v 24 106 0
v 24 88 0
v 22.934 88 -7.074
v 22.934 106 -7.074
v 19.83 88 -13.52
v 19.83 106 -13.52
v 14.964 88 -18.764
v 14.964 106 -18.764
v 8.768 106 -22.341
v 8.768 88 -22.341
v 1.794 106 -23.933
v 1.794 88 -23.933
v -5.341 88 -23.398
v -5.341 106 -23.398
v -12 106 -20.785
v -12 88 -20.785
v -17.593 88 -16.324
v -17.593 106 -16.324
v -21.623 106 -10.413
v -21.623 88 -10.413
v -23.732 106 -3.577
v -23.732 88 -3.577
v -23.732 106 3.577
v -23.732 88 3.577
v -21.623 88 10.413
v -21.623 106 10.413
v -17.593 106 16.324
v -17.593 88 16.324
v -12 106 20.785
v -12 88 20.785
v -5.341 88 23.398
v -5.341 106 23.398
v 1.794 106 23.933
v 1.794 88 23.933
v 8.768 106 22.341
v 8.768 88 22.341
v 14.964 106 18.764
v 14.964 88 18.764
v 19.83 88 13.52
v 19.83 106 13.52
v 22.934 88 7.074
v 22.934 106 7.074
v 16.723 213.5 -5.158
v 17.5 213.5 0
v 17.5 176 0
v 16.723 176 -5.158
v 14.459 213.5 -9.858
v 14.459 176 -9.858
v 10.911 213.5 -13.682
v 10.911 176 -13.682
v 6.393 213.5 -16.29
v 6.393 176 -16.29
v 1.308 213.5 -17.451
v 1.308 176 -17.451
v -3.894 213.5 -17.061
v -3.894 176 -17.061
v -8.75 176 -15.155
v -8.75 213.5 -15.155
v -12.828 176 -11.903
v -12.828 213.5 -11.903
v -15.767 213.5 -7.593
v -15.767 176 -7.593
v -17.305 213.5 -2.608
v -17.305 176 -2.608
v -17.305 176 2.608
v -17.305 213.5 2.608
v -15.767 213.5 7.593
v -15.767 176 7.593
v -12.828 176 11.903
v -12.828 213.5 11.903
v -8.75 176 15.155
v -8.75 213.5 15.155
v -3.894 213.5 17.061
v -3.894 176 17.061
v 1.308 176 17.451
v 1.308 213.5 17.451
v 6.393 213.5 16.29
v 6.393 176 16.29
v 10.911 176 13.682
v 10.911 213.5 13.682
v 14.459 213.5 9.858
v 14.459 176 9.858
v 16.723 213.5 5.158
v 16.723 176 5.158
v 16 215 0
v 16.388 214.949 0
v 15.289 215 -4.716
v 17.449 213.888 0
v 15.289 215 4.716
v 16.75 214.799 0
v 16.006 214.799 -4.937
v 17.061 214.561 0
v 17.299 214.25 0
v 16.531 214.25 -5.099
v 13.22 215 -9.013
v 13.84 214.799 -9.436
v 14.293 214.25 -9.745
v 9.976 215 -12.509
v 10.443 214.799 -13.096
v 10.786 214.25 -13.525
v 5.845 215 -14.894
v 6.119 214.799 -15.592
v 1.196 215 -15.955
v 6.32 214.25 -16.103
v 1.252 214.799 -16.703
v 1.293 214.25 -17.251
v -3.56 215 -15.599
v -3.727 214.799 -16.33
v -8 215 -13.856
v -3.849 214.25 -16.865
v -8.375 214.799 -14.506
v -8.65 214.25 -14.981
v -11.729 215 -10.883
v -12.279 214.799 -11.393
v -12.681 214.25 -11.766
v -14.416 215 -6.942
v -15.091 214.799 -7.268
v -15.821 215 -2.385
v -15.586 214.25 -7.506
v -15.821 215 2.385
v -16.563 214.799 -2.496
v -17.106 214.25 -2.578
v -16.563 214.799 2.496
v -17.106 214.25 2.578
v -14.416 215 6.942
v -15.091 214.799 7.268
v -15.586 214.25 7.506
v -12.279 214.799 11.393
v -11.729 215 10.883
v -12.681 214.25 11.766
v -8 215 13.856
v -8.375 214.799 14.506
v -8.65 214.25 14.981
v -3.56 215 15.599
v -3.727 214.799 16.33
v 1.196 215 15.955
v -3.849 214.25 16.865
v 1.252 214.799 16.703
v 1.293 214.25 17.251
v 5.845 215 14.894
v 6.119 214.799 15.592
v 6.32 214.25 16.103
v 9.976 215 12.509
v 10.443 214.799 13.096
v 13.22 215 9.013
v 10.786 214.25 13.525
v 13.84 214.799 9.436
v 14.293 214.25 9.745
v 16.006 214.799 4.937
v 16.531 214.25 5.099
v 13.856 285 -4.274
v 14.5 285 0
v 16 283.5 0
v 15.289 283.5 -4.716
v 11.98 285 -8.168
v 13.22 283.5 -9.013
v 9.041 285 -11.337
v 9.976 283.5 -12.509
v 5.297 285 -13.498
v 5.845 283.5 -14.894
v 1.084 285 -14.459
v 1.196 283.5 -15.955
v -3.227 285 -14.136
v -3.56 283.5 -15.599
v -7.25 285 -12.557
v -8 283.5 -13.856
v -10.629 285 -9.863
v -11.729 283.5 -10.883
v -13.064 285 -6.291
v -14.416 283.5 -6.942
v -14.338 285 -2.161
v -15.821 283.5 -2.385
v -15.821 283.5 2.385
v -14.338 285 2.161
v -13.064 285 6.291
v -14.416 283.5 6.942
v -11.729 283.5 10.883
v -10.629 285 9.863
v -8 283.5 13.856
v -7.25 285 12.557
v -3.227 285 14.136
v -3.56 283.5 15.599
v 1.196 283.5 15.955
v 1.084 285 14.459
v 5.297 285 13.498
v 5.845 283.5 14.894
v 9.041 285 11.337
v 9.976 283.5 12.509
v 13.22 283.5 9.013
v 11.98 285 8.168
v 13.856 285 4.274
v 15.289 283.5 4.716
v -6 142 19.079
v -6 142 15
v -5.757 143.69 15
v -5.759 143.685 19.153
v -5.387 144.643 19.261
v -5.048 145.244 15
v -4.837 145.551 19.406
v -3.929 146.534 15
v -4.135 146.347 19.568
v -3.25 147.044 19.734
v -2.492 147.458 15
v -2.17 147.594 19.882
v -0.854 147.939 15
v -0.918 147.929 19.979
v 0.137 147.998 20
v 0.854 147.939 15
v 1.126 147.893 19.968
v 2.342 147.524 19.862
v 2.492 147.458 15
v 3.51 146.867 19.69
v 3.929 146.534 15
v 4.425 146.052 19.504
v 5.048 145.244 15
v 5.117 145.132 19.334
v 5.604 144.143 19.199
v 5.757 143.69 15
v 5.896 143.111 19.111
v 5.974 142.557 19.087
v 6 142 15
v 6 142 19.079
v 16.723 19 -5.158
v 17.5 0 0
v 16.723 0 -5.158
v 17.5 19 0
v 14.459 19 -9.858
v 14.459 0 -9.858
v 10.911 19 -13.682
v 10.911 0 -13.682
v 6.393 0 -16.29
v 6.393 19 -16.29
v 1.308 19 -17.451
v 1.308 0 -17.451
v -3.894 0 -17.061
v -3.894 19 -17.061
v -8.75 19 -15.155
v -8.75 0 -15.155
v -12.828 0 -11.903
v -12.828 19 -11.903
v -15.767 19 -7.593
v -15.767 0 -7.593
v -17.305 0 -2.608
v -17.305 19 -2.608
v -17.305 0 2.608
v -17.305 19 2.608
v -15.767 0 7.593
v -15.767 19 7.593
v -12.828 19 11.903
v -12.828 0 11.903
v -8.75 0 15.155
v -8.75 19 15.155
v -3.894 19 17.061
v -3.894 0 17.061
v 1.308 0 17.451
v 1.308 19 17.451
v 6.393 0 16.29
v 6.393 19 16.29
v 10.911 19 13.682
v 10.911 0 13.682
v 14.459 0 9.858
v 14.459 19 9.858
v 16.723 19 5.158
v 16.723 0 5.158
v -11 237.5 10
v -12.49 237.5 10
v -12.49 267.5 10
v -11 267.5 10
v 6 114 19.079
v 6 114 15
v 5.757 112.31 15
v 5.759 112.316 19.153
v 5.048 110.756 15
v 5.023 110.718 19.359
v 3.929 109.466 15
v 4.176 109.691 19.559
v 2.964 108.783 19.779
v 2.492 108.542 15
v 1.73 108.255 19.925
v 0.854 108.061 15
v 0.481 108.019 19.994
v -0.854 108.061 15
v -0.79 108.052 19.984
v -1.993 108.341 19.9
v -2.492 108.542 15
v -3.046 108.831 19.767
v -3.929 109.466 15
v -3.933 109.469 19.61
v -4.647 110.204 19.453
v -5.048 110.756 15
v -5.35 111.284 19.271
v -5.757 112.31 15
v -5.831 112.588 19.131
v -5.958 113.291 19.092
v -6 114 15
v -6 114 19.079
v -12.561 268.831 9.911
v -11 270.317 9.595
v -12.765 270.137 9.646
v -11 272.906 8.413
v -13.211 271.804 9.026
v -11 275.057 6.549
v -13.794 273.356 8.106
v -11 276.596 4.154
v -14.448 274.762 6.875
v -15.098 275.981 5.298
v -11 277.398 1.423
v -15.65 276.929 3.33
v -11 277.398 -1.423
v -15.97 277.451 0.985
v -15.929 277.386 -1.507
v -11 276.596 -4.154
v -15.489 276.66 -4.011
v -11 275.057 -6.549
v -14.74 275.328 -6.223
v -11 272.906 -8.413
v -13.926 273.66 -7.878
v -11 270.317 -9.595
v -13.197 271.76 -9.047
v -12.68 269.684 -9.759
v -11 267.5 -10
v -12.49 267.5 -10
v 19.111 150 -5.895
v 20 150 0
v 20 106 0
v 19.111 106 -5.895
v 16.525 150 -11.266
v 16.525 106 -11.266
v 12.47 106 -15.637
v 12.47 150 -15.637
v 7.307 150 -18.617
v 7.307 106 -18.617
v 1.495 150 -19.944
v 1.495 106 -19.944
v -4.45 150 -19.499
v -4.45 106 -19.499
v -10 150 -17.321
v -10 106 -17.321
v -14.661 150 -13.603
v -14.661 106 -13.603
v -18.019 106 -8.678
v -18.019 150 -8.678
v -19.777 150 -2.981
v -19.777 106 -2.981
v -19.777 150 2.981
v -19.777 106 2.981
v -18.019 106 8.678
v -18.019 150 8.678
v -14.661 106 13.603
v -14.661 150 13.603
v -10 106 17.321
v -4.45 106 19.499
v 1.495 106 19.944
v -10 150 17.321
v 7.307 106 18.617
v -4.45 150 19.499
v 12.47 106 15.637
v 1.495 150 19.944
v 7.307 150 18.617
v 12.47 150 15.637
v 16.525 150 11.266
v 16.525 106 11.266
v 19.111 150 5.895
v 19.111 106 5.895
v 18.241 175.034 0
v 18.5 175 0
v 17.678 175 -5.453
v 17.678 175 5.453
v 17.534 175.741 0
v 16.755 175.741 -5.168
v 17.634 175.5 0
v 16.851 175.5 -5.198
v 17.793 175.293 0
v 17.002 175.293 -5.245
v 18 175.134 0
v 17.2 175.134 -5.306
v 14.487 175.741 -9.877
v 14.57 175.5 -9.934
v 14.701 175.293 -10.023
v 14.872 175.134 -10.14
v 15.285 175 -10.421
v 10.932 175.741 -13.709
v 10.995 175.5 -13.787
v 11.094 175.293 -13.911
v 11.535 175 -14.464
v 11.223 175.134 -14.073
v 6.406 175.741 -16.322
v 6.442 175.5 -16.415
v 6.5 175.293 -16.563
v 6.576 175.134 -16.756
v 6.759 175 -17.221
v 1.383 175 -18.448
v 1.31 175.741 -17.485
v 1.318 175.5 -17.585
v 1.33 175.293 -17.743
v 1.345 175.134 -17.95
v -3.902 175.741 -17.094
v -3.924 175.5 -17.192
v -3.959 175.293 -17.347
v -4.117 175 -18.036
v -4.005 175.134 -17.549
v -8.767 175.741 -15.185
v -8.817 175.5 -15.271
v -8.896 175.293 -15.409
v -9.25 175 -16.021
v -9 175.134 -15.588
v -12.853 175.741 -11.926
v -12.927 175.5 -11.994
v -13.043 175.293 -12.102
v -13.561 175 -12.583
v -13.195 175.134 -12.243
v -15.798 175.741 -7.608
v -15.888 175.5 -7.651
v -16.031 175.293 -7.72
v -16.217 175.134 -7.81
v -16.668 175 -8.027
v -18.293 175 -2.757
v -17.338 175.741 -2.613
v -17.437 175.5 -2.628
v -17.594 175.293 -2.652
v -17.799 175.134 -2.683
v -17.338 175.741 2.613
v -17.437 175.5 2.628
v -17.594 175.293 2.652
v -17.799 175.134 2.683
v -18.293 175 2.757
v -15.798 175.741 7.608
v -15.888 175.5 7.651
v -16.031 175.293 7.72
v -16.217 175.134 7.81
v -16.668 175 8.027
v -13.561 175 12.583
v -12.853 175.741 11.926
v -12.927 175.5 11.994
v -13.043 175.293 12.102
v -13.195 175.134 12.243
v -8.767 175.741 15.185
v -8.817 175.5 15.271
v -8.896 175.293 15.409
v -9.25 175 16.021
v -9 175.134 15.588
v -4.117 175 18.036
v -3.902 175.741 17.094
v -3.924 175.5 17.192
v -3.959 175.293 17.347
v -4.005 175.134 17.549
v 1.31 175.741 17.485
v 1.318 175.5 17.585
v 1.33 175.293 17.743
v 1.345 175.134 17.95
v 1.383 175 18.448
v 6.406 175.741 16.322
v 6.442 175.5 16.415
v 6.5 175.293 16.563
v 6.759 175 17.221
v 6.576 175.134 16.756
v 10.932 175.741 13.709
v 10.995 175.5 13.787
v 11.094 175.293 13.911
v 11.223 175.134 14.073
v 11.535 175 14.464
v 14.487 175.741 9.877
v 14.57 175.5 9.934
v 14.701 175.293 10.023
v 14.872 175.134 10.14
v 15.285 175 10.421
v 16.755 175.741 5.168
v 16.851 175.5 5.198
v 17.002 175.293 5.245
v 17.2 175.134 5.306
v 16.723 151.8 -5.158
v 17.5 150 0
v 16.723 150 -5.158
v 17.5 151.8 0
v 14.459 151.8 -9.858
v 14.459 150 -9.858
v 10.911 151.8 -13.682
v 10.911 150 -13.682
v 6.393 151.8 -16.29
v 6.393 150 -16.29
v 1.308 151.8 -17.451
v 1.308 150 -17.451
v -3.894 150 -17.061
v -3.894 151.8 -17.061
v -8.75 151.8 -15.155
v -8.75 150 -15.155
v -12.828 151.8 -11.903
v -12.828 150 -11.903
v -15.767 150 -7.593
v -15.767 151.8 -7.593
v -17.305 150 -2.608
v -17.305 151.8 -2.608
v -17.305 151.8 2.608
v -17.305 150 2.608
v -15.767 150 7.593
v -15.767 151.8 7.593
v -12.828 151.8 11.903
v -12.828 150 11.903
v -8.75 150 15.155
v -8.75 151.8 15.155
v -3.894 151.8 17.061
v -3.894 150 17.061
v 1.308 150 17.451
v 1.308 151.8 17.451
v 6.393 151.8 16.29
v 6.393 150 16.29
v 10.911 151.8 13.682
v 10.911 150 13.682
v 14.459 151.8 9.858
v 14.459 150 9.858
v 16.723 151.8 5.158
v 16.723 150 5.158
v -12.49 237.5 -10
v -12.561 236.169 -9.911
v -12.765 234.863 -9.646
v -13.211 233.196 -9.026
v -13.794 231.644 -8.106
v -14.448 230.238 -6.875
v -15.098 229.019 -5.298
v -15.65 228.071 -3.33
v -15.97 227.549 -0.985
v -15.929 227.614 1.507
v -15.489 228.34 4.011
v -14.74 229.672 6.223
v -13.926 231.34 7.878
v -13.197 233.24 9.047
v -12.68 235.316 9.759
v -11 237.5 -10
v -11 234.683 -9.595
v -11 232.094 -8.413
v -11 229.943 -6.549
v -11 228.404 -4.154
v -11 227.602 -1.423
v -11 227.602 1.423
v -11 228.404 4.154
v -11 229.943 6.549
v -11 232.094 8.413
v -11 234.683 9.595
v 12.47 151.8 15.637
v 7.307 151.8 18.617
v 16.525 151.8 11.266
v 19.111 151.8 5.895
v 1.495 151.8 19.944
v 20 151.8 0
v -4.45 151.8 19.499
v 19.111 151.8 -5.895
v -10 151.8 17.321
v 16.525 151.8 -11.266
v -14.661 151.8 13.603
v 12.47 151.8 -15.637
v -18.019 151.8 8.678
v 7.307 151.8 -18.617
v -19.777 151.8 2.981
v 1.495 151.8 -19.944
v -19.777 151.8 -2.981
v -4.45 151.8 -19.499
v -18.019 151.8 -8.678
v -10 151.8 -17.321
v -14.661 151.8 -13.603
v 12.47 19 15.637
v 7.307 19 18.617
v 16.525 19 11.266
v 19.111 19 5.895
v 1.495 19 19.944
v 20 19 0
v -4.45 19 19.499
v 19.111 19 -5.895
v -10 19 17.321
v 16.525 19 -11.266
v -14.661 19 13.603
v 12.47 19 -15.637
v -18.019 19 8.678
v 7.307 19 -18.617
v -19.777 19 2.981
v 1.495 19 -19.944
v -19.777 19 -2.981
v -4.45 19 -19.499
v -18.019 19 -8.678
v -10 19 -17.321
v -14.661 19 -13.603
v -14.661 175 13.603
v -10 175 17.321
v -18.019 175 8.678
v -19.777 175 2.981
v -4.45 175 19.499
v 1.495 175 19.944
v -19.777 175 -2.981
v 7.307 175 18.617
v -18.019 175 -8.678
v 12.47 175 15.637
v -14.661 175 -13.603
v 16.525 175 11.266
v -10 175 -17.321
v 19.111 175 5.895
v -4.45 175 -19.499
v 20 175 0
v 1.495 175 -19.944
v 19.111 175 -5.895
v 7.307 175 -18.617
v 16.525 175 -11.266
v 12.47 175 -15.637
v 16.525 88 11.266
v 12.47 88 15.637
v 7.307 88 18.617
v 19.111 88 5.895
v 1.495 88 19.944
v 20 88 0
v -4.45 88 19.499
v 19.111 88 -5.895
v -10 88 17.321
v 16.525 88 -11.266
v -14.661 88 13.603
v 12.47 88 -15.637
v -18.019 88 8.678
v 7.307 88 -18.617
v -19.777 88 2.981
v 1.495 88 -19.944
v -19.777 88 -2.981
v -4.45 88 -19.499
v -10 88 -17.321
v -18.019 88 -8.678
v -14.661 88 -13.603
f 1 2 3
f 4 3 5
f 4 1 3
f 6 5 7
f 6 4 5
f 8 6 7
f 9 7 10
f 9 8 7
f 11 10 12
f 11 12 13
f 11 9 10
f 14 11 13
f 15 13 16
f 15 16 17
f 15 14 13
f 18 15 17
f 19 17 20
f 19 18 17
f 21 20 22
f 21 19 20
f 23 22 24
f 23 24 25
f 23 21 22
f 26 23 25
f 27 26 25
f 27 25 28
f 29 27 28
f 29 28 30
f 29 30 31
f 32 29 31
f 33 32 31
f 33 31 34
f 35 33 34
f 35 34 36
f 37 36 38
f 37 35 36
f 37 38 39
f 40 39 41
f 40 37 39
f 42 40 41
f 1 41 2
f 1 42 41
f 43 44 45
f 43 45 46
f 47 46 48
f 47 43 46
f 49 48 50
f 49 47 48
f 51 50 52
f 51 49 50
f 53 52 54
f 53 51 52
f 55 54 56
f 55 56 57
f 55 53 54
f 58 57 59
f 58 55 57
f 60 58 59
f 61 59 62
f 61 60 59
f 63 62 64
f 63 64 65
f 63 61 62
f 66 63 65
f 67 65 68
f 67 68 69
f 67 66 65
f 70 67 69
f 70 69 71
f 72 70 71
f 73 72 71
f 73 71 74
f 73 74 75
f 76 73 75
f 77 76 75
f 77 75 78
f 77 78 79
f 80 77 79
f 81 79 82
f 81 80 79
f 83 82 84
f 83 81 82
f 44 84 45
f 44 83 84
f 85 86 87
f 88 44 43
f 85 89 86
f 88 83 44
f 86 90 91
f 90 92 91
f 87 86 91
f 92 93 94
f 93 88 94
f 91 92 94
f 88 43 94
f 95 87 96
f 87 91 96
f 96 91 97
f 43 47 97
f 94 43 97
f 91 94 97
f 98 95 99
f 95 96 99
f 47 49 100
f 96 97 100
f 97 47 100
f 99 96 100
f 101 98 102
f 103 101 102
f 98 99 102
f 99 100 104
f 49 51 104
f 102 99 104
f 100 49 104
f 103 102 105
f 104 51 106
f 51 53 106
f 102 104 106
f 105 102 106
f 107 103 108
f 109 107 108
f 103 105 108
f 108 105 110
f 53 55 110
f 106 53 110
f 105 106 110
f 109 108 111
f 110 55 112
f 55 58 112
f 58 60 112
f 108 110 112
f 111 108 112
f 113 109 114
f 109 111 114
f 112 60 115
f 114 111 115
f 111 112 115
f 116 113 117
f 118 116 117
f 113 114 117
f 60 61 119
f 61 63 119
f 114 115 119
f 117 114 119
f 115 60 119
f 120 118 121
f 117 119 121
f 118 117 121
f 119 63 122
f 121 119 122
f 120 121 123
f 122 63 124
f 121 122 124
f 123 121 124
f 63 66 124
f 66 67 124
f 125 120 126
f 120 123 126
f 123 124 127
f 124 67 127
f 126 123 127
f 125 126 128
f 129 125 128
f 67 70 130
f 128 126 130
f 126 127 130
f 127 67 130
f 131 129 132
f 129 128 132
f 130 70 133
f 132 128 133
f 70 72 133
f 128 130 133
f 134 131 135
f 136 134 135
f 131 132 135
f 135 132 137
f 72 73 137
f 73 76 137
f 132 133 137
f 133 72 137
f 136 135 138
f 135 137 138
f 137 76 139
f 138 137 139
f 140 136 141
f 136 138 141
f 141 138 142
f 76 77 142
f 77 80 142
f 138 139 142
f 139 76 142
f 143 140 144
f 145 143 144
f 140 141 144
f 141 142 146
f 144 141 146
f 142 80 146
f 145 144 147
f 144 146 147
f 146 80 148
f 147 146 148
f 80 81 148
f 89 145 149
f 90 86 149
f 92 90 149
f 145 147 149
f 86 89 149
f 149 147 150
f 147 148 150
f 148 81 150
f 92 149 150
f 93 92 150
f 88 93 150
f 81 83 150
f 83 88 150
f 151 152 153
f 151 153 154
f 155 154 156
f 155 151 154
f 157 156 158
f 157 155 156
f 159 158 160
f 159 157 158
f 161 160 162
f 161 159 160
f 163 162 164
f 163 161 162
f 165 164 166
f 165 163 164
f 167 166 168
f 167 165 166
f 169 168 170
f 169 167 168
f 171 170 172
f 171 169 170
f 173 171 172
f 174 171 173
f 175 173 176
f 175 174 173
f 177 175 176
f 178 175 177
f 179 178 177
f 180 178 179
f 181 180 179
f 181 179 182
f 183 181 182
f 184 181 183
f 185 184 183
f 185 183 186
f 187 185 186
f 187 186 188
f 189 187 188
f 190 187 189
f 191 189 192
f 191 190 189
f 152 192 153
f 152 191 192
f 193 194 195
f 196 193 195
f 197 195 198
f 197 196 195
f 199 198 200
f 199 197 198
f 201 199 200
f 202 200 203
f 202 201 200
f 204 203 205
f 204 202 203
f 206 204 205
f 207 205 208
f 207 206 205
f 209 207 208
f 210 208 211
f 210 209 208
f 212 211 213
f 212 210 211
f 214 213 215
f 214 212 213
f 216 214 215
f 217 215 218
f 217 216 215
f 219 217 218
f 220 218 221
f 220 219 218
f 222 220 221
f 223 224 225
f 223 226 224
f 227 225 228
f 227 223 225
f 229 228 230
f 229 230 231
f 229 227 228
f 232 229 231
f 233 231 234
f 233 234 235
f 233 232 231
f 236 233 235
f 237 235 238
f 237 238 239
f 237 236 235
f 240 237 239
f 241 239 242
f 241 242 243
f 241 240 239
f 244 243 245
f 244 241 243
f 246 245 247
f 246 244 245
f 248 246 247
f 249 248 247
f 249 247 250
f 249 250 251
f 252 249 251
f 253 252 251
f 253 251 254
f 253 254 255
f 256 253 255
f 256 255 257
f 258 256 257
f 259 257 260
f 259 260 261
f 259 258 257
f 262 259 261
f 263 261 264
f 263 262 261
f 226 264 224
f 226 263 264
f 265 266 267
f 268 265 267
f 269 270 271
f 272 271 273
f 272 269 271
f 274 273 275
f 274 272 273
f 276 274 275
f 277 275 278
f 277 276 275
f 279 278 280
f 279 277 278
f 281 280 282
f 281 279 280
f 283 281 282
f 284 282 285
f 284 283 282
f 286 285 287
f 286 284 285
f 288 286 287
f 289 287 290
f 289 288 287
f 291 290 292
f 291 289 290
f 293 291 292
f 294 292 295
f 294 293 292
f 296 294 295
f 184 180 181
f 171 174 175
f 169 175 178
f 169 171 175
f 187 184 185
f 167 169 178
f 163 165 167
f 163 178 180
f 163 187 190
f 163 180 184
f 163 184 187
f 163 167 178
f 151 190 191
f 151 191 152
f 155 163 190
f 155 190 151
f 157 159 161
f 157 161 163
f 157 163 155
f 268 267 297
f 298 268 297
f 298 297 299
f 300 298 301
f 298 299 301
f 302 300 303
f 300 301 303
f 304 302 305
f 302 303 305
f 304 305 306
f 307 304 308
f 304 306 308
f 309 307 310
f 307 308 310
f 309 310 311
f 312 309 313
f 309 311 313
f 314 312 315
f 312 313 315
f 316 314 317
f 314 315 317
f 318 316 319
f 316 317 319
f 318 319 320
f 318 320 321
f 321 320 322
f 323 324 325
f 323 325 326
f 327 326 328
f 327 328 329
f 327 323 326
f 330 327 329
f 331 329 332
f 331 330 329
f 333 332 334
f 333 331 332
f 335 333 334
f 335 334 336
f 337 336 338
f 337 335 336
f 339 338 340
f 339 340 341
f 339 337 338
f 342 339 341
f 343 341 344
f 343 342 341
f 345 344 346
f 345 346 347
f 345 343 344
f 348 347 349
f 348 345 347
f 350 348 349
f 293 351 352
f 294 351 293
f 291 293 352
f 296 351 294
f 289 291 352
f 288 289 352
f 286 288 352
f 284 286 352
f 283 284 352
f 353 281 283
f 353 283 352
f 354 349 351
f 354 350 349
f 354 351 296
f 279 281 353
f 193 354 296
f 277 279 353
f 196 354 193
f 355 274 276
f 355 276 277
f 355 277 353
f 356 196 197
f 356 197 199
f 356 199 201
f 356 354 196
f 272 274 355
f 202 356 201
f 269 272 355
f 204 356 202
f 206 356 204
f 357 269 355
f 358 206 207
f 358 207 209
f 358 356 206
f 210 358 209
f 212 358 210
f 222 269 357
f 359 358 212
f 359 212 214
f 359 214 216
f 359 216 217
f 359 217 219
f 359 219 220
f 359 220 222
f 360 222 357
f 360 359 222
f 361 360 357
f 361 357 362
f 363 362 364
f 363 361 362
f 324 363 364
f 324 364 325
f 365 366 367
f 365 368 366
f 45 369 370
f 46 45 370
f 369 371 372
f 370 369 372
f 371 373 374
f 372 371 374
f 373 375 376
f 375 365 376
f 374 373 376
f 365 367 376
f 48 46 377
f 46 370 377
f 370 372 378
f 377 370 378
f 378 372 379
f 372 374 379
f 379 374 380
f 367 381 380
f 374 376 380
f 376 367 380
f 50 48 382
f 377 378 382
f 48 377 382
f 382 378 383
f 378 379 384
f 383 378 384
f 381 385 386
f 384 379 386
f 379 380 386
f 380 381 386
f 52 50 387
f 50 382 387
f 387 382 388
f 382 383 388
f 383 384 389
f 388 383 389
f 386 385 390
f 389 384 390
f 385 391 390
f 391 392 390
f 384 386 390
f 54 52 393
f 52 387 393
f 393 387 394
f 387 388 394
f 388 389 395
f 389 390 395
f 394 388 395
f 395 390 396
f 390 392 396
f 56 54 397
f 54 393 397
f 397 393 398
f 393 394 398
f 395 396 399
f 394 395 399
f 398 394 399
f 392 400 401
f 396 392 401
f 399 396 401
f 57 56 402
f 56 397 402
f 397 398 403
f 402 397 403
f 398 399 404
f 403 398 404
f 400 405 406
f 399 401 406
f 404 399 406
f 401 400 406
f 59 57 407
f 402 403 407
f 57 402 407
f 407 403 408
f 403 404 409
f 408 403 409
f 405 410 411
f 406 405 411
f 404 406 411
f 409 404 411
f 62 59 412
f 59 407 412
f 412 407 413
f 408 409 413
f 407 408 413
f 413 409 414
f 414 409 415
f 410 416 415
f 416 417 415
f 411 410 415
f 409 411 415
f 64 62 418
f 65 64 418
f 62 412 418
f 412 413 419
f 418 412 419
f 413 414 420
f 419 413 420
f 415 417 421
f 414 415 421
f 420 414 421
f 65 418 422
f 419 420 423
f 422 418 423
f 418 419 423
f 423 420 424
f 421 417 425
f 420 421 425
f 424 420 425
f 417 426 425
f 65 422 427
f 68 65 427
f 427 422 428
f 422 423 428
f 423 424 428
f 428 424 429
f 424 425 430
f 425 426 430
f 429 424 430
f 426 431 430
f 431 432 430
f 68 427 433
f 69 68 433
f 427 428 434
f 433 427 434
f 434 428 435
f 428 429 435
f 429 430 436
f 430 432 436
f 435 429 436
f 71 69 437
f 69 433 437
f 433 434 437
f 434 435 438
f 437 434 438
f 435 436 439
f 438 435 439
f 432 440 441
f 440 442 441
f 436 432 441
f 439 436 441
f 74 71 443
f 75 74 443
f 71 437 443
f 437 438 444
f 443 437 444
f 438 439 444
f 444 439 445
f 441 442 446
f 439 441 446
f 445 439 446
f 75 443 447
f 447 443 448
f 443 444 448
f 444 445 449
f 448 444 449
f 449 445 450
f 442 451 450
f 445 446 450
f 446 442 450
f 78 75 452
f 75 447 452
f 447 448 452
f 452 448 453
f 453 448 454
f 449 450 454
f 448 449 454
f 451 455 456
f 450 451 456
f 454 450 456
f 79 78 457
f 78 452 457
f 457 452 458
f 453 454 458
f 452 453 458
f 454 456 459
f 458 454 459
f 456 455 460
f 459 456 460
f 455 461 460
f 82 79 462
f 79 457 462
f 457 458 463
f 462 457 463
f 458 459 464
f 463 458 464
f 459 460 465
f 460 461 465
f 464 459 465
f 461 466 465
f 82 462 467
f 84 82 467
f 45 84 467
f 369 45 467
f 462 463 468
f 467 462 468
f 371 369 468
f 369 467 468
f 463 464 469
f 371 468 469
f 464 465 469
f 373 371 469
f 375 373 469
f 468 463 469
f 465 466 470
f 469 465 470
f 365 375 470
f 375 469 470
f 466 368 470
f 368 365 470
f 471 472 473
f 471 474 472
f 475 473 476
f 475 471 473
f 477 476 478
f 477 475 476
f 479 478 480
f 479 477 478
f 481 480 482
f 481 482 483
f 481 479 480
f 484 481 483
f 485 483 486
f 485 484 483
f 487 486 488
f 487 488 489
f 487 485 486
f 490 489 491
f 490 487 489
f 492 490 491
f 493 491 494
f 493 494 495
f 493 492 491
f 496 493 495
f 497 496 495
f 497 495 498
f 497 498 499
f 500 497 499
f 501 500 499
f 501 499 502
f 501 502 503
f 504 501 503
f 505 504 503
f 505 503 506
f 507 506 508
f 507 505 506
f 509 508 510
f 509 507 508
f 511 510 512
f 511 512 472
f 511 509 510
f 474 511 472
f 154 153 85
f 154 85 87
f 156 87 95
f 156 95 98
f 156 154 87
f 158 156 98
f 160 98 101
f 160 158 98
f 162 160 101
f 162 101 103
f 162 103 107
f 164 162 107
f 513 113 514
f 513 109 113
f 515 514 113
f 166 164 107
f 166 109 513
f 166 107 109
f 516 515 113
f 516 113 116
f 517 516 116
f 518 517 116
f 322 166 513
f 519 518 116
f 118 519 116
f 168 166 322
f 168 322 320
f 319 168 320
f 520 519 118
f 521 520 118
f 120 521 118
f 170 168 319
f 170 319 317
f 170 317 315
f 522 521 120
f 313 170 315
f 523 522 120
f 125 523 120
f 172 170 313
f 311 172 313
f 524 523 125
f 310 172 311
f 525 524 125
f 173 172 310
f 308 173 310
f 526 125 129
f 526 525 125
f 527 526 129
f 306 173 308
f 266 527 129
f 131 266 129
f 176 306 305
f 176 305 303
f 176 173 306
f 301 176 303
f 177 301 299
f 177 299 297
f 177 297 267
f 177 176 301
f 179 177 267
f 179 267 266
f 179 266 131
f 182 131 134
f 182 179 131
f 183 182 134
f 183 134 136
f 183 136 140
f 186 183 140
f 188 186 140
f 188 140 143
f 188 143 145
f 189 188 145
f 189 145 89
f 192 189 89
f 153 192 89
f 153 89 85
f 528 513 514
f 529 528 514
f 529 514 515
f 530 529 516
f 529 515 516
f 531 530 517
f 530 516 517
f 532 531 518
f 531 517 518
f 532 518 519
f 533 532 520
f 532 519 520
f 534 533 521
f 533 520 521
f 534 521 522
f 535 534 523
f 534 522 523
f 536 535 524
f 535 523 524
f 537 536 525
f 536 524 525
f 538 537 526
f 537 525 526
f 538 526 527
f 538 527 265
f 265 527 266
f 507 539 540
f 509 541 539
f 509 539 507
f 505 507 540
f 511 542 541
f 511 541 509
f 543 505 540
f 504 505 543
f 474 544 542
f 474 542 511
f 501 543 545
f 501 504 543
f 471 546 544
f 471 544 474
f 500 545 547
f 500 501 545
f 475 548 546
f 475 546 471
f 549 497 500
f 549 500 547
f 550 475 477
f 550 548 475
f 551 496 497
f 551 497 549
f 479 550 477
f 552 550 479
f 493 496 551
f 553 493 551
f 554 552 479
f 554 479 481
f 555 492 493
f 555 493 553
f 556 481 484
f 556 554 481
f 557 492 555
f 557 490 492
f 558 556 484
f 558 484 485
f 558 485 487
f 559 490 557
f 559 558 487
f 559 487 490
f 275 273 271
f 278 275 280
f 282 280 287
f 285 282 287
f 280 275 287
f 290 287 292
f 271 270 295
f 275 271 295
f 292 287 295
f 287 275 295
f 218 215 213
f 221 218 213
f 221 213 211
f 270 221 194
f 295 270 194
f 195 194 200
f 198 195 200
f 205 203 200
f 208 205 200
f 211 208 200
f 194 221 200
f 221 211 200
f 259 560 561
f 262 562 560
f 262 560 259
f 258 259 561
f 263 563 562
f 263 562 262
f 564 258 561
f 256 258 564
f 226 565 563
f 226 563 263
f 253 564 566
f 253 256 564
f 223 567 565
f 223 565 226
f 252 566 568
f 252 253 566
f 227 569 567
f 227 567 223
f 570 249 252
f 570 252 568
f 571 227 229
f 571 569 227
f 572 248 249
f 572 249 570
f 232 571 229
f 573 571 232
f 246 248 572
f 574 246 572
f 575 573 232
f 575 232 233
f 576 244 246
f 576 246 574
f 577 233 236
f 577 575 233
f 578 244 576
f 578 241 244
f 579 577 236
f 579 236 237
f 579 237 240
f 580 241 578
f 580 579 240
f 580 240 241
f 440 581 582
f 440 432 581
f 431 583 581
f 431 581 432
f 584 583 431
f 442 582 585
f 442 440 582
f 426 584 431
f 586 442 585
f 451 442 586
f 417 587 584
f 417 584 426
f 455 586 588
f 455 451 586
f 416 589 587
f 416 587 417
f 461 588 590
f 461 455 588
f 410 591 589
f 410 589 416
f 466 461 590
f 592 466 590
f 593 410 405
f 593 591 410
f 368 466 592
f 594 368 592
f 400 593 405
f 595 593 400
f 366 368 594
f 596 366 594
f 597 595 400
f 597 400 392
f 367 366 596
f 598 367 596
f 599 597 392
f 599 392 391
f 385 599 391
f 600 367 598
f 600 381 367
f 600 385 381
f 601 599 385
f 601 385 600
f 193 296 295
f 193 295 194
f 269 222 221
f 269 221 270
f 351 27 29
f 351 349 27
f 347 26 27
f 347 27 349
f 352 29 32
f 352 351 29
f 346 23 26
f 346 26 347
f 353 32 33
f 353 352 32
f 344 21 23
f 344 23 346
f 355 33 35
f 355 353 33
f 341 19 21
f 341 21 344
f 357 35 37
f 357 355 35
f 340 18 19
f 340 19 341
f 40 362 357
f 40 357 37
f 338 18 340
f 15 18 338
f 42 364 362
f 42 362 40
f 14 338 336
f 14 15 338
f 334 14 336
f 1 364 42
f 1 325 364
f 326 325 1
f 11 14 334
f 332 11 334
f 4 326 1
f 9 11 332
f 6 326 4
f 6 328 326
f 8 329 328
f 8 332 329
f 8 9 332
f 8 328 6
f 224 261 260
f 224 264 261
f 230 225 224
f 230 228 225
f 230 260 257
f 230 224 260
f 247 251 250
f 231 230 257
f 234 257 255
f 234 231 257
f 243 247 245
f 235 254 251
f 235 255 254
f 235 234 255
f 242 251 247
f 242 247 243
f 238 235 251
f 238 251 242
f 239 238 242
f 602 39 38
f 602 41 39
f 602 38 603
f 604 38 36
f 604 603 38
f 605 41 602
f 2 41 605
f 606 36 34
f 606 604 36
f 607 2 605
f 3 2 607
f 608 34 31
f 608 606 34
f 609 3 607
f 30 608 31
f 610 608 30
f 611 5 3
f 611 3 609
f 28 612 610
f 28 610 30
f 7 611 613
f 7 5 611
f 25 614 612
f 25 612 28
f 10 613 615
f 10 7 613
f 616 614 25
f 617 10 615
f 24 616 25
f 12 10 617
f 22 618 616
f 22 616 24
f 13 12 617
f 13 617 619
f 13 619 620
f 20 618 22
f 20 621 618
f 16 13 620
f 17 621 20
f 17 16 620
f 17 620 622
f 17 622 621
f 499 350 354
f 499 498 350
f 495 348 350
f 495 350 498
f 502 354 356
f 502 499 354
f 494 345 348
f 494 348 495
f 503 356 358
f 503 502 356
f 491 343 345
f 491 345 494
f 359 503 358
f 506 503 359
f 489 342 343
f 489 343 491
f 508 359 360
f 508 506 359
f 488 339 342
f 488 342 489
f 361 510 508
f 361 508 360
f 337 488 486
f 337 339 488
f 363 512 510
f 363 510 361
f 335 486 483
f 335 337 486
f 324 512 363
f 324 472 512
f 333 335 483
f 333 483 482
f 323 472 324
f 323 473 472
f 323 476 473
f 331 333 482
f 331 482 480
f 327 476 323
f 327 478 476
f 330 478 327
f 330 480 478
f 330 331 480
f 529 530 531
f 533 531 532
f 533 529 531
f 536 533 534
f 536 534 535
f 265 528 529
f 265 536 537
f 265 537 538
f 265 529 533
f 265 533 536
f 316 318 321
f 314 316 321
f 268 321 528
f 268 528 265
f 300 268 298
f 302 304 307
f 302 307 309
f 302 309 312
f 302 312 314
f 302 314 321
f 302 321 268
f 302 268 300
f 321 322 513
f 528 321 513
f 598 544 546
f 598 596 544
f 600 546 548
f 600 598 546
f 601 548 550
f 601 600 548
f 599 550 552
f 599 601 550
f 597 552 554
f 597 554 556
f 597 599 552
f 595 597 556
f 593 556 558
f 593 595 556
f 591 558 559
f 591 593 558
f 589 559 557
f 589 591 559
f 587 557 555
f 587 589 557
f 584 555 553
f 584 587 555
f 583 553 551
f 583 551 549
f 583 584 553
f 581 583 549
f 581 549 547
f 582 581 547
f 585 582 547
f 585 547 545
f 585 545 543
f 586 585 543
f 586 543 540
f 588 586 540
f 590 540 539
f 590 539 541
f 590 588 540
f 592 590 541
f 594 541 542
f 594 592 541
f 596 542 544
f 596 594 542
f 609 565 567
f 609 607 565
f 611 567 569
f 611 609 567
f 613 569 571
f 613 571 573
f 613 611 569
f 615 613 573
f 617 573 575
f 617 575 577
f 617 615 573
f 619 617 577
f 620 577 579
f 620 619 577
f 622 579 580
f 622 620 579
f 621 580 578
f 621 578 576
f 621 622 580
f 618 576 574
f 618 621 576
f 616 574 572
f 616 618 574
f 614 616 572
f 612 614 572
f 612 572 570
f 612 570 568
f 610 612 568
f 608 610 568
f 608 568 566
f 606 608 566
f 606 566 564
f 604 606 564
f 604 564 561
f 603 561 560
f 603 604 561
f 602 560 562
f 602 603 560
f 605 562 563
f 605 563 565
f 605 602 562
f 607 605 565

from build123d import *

# Parameters (mm, degrees)
CHAMFER1_SIZE      = 1.5
FILLET2_R          = 1.5
CUT_EXTRUDE1_DEPTH = 5
CUT_EXTRUDE2_DEPTH = 5
FILLET4_R          = 1


with BuildPart() as part:
    # Sketch1 → Revolve1 (revolve)
    with BuildSketch(Plane.XY):
        Polygon((0, 0), (17.5, 0), (17.5, 19), (20, 19), (20, 88), (24, 88), (24, 106), (20, 106), (20, 150), (17.5, 150), (17.5, 151.8), (20, 151.8), (20, 175), (17.5, 175), (17.5, 215), (16, 215), (16, 285), (0, 285), align=None)
    revolve(axis=Axis((0, 0, 0), (0, 1, 0)))

    # Chamfer1
    chamfer1_edges = [part.edges().sort_by_distance(p)[0] for p in [
        (-16, 285, 0),
    ]]
    chamfer(chamfer1_edges, length=CHAMFER1_SIZE)

    # Fillet2
    fillet2_edges = [part.edges().sort_by_distance(p)[0] for p in [
        (-17.5, 215, 0),
    ]]
    fillet(fillet2_edges, radius=FILLET2_R - 0.0001)  # a hair under: the kernel refuses the full size

    # Sketch3 → Cut-Extrude1 (cut)
    with BuildSketch(Plane.XY.offset(20)):
        with BuildLine():
            Line((6, 142), (6, 114))
            ThreePointArc((6, 114), (0, 108), (-6, 114))
            Line((-6, 114), (-6, 142))
            ThreePointArc((-6, 142), (0, 148), (6, 142))
        make_face()
    extrude(amount=-CUT_EXTRUDE1_DEPTH, mode=Mode.SUBTRACT)

    # Sketch4 → Cut-Extrude2 (cut)
    with BuildSketch(Plane(origin=(-16, 0, 0), x_dir=(0, 0, -1), z_dir=(1, 0, 0))):
        with BuildLine():
            Line((10, 267.5), (10, 237.5))
            ThreePointArc((10, 237.5), (0, 227.5), (-10, 237.5))
            Line((-10, 237.5), (-10, 267.5))
            ThreePointArc((-10, 267.5), (0, 277.5), (10, 267.5))
        make_face()
    extrude(amount=CUT_EXTRUDE2_DEPTH, mode=Mode.SUBTRACT)

    # Fillet4
    fillet4_edges = [part.edges().sort_by_distance(p)[0] for p in [
        (-17.5, 175, 0),
    ]]
    fillet(fillet4_edges, radius=FILLET4_R)


solid = part.part
